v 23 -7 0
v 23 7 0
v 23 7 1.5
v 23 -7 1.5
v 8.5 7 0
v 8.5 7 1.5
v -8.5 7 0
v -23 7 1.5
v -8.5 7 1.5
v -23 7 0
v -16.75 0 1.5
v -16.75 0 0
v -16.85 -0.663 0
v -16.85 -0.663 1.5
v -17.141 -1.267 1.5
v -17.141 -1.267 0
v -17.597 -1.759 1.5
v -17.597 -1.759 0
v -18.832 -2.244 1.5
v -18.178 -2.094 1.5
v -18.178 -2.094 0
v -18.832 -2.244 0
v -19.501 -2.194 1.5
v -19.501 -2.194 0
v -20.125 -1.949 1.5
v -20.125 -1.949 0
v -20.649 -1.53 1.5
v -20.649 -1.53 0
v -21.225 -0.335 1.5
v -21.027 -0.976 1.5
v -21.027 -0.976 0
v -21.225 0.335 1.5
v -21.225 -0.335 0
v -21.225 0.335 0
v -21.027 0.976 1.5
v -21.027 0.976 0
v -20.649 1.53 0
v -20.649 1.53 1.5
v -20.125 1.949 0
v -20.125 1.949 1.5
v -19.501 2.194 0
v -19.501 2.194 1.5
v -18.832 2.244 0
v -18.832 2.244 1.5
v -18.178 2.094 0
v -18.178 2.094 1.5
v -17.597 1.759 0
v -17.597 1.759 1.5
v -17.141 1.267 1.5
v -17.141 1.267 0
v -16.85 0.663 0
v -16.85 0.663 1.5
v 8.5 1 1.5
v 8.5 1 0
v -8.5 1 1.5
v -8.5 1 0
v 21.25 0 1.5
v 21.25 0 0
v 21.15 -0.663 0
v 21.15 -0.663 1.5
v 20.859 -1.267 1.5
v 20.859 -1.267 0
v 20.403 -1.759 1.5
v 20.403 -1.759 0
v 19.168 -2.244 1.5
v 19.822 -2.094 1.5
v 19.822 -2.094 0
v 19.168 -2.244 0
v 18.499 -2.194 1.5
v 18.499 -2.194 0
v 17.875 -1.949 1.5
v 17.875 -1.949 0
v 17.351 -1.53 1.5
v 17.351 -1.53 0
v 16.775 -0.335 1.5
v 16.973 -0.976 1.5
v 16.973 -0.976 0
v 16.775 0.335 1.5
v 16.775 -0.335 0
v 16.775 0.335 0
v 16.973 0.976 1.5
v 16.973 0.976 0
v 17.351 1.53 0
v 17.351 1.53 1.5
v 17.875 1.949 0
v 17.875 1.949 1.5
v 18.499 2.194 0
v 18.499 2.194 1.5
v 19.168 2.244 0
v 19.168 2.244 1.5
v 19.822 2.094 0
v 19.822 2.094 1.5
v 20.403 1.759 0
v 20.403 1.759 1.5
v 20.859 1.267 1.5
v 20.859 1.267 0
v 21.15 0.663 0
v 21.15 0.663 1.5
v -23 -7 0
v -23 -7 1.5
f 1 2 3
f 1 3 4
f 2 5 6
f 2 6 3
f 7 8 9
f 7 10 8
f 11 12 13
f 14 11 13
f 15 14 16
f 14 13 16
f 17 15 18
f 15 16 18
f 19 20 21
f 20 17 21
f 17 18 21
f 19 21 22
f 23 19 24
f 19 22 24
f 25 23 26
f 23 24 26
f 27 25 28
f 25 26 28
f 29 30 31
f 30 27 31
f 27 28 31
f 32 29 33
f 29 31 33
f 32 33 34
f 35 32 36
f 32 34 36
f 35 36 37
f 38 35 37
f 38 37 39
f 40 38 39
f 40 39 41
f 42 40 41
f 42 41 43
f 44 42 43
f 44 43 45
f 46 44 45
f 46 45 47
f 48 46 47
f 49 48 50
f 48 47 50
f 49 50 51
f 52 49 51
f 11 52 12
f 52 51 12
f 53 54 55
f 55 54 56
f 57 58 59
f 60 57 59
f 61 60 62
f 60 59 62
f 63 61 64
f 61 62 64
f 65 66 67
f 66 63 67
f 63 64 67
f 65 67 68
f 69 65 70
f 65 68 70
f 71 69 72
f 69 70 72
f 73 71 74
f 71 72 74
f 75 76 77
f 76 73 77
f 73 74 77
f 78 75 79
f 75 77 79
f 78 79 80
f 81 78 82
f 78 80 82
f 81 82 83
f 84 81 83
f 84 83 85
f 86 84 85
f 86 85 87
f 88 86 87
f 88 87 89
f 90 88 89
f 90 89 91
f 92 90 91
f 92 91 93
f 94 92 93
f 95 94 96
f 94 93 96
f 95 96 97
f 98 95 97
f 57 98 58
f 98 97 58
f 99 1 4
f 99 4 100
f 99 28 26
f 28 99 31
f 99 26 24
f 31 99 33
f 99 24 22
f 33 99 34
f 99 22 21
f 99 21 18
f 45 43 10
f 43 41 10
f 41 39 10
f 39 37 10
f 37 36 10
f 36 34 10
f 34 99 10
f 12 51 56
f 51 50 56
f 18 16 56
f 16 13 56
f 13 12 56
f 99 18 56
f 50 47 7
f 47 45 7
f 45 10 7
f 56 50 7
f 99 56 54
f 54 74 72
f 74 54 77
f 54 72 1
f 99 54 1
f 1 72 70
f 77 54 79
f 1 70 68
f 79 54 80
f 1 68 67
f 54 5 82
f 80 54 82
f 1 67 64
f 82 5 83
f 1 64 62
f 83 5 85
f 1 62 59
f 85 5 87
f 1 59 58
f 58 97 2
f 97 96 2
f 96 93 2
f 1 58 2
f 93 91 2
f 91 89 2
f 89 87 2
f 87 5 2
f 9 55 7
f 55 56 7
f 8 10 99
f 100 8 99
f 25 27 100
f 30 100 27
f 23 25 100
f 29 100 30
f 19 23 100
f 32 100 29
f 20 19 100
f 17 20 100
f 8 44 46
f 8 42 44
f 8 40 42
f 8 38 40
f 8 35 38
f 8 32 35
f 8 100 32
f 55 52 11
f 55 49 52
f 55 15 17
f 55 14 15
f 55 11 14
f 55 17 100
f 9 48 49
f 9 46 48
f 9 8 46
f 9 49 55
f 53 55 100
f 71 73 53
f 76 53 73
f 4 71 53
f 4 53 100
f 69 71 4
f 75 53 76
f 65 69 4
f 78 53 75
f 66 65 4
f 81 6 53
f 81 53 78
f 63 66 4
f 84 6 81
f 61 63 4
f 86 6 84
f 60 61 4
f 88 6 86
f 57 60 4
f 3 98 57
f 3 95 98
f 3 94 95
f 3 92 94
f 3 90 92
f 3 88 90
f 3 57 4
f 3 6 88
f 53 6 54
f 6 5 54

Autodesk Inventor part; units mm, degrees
ref_plane "YZ Plane" through (0, 0, 0) normal (1, 0, 0) x (0, 1, 0)
ref_plane "XZ Plane" through (0, 0, 0) normal (0, 1, 0) x (-1, 0, 0)
ref_plane "XY Plane" through (0, 0, 0) normal (0, 0, 1) x (1, 0, 0)
sketch "Sketch1" plane through (0, 0, 0) normal (0, 0, 1) x (1, 0, 0)
  line L0 (-15, 7) -> (15, 7)
  line L1 (15, 7) -> (15, -7)
  line L2 (15, -7) -> (-15, -7)
  line L3 (-15, -7) -> (-15, 7)
  line L4 (-15, 7) -> (-23, 7)
  line L5 (-23, 7) -> (-23, -7)
  line L6 (-23, -7) -> (-15, -7)
  line L7 (-15, -7) -> (-15, 7)
  line L8 (15, 7) -> (23, 7)
  line L9 (23, 7) -> (23, -7)
  line L10 (23, -7) -> (15, -7)
  line L11 (15, -7) -> (15, 7)
  line L12 (-23, 0) -> (23, 0) construction
  circle A0 centre (-19, 0) radius 2.25
  circle A1 centre (19, 0) radius 2.25
  line L13 (0, 7) -> (0, -7) construction
  line L14 (-8.5, 7) -> (8.5, 7)
  line L15 (8.5, 7) -> (8.5, 1)
  line L16 (8.5, 1) -> (-8.5, 1)
  line L17 (-8.5, 1) -> (-8.5, 7)
  point P0 (0, 0)
  point P1 (0, 0)
  point P2 (0, 7)
  point P3 (0, 0)
  dimension "d0" = 14
  dimension "d1" = 30
  dimension "d2" = 4.5
  dimension "d3" = 4.5
  dimension "d4" = 4
  dimension "d5" = 4
  dimension "d6" = 4
  dimension "d7" = 4
  dimension "d10" = 17
  dimension "d11" = 6
extrude "Extrusion1" add sketch "Sketch1" along normal blind 1.5 contours L0 L17 L16 L15 L1 L2 L3 | L3 L6 L5 L4 | L1 L8 L9 L10
properties part number "MotorBar"
